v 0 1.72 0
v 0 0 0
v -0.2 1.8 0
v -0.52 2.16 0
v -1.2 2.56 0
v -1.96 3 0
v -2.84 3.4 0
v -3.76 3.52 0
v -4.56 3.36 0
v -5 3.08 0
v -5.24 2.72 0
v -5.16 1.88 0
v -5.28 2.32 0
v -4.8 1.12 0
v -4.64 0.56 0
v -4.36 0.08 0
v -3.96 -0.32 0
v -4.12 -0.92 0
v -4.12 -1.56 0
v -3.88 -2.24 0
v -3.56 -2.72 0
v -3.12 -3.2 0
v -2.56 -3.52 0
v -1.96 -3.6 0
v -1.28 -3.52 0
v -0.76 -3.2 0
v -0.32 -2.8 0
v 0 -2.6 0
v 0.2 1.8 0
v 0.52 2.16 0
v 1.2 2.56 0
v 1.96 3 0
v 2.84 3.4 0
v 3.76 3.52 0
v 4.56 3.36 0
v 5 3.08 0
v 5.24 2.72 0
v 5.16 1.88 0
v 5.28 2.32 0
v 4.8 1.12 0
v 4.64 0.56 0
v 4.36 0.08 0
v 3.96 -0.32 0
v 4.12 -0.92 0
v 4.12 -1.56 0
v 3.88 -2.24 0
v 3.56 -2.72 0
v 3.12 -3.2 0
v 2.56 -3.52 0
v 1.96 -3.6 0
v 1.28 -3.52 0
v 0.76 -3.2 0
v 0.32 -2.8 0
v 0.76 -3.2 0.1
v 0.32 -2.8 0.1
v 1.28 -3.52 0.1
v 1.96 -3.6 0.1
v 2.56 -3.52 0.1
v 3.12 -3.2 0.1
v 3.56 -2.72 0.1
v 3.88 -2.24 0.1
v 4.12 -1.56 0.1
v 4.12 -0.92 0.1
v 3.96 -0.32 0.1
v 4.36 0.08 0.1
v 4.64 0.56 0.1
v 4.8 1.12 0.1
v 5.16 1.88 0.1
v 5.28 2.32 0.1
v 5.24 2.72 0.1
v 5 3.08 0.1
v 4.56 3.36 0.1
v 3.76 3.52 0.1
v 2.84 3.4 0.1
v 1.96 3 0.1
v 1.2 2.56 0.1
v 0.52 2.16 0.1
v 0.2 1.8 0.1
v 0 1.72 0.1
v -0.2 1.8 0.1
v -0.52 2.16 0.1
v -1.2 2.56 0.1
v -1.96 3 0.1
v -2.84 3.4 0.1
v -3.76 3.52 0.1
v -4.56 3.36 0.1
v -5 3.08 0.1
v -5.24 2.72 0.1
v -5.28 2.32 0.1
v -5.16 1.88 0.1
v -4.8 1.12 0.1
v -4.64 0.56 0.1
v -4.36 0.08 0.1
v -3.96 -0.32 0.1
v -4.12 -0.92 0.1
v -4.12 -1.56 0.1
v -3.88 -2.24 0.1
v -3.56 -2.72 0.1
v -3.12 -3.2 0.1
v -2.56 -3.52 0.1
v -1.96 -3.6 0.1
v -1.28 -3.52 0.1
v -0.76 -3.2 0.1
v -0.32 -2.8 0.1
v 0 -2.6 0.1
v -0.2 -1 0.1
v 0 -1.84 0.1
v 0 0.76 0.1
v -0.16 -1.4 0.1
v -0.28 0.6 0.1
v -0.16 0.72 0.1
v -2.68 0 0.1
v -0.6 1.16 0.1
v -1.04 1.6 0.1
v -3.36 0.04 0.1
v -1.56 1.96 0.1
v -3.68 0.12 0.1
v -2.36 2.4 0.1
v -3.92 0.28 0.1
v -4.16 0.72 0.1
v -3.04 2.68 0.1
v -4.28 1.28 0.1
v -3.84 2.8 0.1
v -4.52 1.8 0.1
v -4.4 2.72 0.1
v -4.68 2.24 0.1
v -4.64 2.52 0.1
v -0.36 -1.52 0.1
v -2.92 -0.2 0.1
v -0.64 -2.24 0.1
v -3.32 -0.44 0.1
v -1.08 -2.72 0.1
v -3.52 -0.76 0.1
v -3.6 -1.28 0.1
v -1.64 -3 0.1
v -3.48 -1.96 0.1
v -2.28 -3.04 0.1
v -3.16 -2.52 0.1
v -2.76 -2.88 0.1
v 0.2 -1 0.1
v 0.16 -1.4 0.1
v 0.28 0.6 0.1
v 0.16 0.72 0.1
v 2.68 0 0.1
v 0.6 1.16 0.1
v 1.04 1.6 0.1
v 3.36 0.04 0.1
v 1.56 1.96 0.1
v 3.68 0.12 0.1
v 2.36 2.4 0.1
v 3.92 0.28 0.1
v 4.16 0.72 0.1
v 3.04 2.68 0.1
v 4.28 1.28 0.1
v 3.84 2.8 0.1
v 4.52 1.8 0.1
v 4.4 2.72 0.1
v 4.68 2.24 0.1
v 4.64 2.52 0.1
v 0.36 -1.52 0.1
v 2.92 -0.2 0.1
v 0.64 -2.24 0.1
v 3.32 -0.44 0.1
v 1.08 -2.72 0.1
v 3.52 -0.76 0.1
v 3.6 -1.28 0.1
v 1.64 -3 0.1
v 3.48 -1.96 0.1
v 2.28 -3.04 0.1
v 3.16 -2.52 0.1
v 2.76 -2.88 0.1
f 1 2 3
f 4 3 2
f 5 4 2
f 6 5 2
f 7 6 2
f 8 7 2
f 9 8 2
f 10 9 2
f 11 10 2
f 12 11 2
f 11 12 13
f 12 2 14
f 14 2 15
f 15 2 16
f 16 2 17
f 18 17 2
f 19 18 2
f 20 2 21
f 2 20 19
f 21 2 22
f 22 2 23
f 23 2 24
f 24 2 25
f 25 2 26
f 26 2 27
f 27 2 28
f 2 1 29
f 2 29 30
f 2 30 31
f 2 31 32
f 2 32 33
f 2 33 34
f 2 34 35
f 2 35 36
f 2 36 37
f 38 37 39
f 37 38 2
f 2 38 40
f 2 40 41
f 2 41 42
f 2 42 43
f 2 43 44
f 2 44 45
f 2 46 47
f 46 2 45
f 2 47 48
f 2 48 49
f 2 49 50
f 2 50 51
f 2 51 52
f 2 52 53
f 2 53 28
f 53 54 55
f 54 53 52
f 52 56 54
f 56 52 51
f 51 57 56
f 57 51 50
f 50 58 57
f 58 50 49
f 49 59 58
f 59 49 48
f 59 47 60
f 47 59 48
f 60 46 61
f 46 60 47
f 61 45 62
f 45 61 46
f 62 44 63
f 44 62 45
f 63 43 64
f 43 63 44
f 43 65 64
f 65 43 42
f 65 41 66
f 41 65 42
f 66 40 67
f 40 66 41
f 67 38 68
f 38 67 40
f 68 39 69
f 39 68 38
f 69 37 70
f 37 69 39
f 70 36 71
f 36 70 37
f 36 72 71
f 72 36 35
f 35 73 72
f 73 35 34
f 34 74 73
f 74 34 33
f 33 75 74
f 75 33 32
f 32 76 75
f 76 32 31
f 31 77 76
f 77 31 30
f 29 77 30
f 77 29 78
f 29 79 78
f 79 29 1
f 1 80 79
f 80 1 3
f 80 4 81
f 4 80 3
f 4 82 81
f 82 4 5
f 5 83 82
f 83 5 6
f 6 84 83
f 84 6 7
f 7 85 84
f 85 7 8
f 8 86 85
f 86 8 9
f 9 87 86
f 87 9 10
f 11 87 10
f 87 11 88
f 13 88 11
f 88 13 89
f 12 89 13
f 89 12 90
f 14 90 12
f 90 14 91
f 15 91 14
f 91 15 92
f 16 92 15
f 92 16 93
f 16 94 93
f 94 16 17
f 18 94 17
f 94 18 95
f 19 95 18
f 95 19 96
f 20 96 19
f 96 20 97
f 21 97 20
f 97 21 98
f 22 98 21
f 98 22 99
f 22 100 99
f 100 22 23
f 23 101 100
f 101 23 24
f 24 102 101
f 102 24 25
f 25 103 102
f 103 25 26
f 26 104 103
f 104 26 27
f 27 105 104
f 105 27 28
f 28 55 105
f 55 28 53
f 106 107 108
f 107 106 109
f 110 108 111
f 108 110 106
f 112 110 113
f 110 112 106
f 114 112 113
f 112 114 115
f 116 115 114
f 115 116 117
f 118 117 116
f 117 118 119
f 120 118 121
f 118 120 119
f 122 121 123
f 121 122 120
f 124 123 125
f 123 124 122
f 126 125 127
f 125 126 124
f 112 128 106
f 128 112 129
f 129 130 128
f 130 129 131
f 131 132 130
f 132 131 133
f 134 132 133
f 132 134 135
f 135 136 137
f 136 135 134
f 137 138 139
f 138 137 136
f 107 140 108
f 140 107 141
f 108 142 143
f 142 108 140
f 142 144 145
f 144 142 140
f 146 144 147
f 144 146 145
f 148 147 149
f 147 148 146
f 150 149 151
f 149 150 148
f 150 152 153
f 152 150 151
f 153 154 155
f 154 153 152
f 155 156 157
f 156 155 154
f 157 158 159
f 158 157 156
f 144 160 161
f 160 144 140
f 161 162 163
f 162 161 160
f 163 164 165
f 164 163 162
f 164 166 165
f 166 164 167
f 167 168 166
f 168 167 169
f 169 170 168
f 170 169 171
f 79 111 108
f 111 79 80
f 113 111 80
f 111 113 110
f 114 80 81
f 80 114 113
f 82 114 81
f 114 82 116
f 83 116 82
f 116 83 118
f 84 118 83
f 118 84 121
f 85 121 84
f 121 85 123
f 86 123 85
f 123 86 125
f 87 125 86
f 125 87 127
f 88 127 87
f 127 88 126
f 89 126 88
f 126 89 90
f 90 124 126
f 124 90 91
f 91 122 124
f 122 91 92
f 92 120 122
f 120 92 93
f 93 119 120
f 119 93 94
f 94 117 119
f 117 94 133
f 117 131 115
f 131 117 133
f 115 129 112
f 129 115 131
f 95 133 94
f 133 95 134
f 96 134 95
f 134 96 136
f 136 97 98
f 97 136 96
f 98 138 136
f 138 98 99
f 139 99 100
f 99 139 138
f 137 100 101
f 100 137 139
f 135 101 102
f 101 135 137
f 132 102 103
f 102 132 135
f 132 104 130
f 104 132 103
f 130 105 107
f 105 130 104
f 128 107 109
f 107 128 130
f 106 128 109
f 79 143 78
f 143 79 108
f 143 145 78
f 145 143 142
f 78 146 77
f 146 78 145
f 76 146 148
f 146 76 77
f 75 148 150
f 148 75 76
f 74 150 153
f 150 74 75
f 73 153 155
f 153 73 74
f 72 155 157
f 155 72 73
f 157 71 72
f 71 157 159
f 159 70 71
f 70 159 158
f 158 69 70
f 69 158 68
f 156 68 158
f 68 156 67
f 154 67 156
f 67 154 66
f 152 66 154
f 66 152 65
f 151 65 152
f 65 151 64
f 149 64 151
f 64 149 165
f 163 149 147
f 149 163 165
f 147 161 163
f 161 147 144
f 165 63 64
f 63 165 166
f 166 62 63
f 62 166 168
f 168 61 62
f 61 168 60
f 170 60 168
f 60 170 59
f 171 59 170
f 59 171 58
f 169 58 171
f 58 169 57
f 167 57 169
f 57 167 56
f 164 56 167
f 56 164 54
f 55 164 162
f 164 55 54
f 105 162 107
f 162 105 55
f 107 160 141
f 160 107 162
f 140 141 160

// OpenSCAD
// file: s/4650854is02.scad
use <../../lib.scad>
function ldraw_lib__s__4650854is02() = [
// 0 ~Sticker  0.9 x  1.3 with Butterfly - Shape
// 0 Name: s\4650854is02.dat
// 0 Author: Takeshi Takahashi [RainbowDolphin]
// 0 !LDRAW_ORG Subpart UPDATE 2024-04
// 0 !LICENSE Licensed under CC BY 4.0 : see CAreadme.txt
// 
// 0 BFC CERTIFY CCW
  [0,"BFC","CERTIFY"],
  [0,"BFC","CCW"],
// 
// 0 !HISTORY 2024-05-28 [OrionP] Official Update 2024-04
// 
// 
// 4 16 -.5 -.25 -2.5 -.4 -.25 -3.5 0 -.25 -4.6 0 -.25 1.9
  [4,16,-.5,-.25,-2.5,-.4,-.25,-3.5,0,-.25,-4.6,0,-.25,1.9],
// 4 16 -.5 -.25 -2.5 0 -.25 1.9 -.4 -.25 1.8 -.7 -.25 1.5
  [4,16,-.5,-.25,-2.5,0,-.25,1.9,-.4,-.25,1.8,-.7,-.25,1.5],
// 4 16 -6.7 -.25 0 -.5 -.25 -2.5 -.7 -.25 1.5 -1.5 -.25 2.9
  [4,16,-6.7,-.25,0,-.5,-.25,-2.5,-.7,-.25,1.5,-1.5,-.25,2.9],
// 4 16 -8.4 -.25 .1 -6.7 -.25 0 -1.5 -.25 2.9 -2.6 -.25 4
  [4,16,-8.4,-.25,.1,-6.7,-.25,0,-1.5,-.25,2.9,-2.6,-.25,4],
// 4 16 -9.2 -.25 .3 -8.4 -.25 .1 -2.6 -.25 4 -3.9 -.25 4.9
  [4,16,-9.2,-.25,.3,-8.4,-.25,.1,-2.6,-.25,4,-3.9,-.25,4.9],
// 4 16 -9.8 -.25 .7 -9.2 -.25 .3 -3.9 -.25 4.9 -5.9 -.25 6
  [4,16,-9.8,-.25,.7,-9.2,-.25,.3,-3.9,-.25,4.9,-5.9,-.25,6],
// 4 16 -10.4 -.25 1.8 -9.8 -.25 .7 -5.9 -.25 6 -7.6 -.25 6.7
  [4,16,-10.4,-.25,1.8,-9.8,-.25,.7,-5.9,-.25,6,-7.6,-.25,6.7],
// 4 16 -10.7 -.25 3.2 -10.4 -.25 1.8 -7.6 -.25 6.7 -9.6 -.25 7
  [4,16,-10.7,-.25,3.2,-10.4,-.25,1.8,-7.6,-.25,6.7,-9.6,-.25,7],
// 4 16 -11.3 -.25 4.5 -10.7 -.25 3.2 -9.6 -.25 7 -11 -.25 6.8
  [4,16,-11.3,-.25,4.5,-10.7,-.25,3.2,-9.6,-.25,7,-11,-.25,6.8],
// 4 16 -11.7 -.25 5.6 -11.3 -.25 4.5 -11 -.25 6.8 -11.6 -.25 6.3
  [4,16,-11.7,-.25,5.6,-11.3,-.25,4.5,-11,-.25,6.8,-11.6,-.25,6.3],
// 4 16 -.5 -.25 -2.5 -6.7 -.25 0 -7.3 -.25 -.5 -.9 -.25 -3.8
  [4,16,-.5,-.25,-2.5,-6.7,-.25,0,-7.3,-.25,-.5,-.9,-.25,-3.8],
// 4 16 -.9 -.25 -3.8 -7.3 -.25 -.5 -8.3 -.25 -1.1 -1.6 -.25 -5.6
  [4,16,-.9,-.25,-3.8,-7.3,-.25,-.5,-8.3,-.25,-1.1,-1.6,-.25,-5.6],
// 4 16 -1.6 -.25 -5.6 -8.3 -.25 -1.1 -8.8 -.25 -1.9 -2.7 -.25 -6.8
  [4,16,-1.6,-.25,-5.6,-8.3,-.25,-1.1,-8.8,-.25,-1.9,-2.7,-.25,-6.8],
// 4 16 -2.7 -.25 -6.8 -8.8 -.25 -1.9 -9 -.25 -3.2 -4.1 -.25 -7.5
  [4,16,-2.7,-.25,-6.8,-8.8,-.25,-1.9,-9,-.25,-3.2,-4.1,-.25,-7.5],
// 4 16 -4.1 -.25 -7.5 -9 -.25 -3.2 -8.7 -.25 -4.9 -5.7 -.25 -7.6
  [4,16,-4.1,-.25,-7.5,-9,-.25,-3.2,-8.7,-.25,-4.9,-5.7,-.25,-7.6],
// 4 16 -5.7 -.25 -7.6 -8.7 -.25 -4.9 -7.9 -.25 -6.3 -6.9 -.25 -7.2
  [4,16,-5.7,-.25,-7.6,-8.7,-.25,-4.9,-7.9,-.25,-6.3,-6.9,-.25,-7.2],
// 4 16 0 -.25 -4.6 .4 -.25 -3.5 .5 -.25 -2.5 0 -.25 1.9
  [4,16,0,-.25,-4.6,.4,-.25,-3.5,.5,-.25,-2.5,0,-.25,1.9],
// 4 16 .4 -.25 1.8 0 -.25 1.9 .5 -.25 -2.5 .7 -.25 1.5
  [4,16,.4,-.25,1.8,0,-.25,1.9,.5,-.25,-2.5,.7,-.25,1.5],
// 4 16 .7 -.25 1.5 .5 -.25 -2.5 6.7 -.25 0 1.5 -.25 2.9
  [4,16,.7,-.25,1.5,.5,-.25,-2.5,6.7,-.25,0,1.5,-.25,2.9],
// 4 16 1.5 -.25 2.9 6.7 -.25 0 8.4 -.25 .1 2.6 -.25 4
  [4,16,1.5,-.25,2.9,6.7,-.25,0,8.4,-.25,.1,2.6,-.25,4],
// 4 16 2.6 -.25 4 8.4 -.25 .1 9.2 -.25 .3 3.9 -.25 4.9
  [4,16,2.6,-.25,4,8.4,-.25,.1,9.2,-.25,.3,3.9,-.25,4.9],
// 4 16 3.9 -.25 4.9 9.2 -.25 .3 9.8 -.25 .7 5.9 -.25 6
  [4,16,3.9,-.25,4.9,9.2,-.25,.3,9.8,-.25,.7,5.9,-.25,6],
// 4 16 5.9 -.25 6 9.8 -.25 .7 10.4 -.25 1.8 7.6 -.25 6.7
  [4,16,5.9,-.25,6,9.8,-.25,.7,10.4,-.25,1.8,7.6,-.25,6.7],
// 4 16 7.6 -.25 6.7 10.4 -.25 1.8 10.7 -.25 3.2 9.6 -.25 7
  [4,16,7.6,-.25,6.7,10.4,-.25,1.8,10.7,-.25,3.2,9.6,-.25,7],
// 4 16 9.6 -.25 7 10.7 -.25 3.2 11.3 -.25 4.5 11 -.25 6.8
  [4,16,9.6,-.25,7,10.7,-.25,3.2,11.3,-.25,4.5,11,-.25,6.8],
// 4 16 11 -.25 6.8 11.3 -.25 4.5 11.7 -.25 5.6 11.6 -.25 6.3
  [4,16,11,-.25,6.8,11.3,-.25,4.5,11.7,-.25,5.6,11.6,-.25,6.3],
// 4 16 7.3 -.25 -.5 6.7 -.25 0 .5 -.25 -2.5 .9 -.25 -3.8
  [4,16,7.3,-.25,-.5,6.7,-.25,0,.5,-.25,-2.5,.9,-.25,-3.8],
// 4 16 8.3 -.25 -1.1 7.3 -.25 -.5 .9 -.25 -3.8 1.6 -.25 -5.6
  [4,16,8.3,-.25,-1.1,7.3,-.25,-.5,.9,-.25,-3.8,1.6,-.25,-5.6],
// 4 16 8.8 -.25 -1.9 8.3 -.25 -1.1 1.6 -.25 -5.6 2.7 -.25 -6.8
  [4,16,8.8,-.25,-1.9,8.3,-.25,-1.1,1.6,-.25,-5.6,2.7,-.25,-6.8],
// 4 16 9 -.25 -3.2 8.8 -.25 -1.9 2.7 -.25 -6.8 4.1 -.25 -7.5
  [4,16,9,-.25,-3.2,8.8,-.25,-1.9,2.7,-.25,-6.8,4.1,-.25,-7.5],
// 4 16 8.7 -.25 -4.9 9 -.25 -3.2 4.1 -.25 -7.5 5.7 -.25 -7.6
  [4,16,8.7,-.25,-4.9,9,-.25,-3.2,4.1,-.25,-7.5,5.7,-.25,-7.6],
// 4 16 7.9 -.25 -6.3 8.7 -.25 -4.9 5.7 -.25 -7.6 6.9 -.25 -7.2
  [4,16,7.9,-.25,-6.3,8.7,-.25,-4.9,5.7,-.25,-7.6,6.9,-.25,-7.2],
];
module ldraw_lib__s__4650854is02(step=0, col=false, unit=2/5, alt=false, line=0.2, solid=!$preview)
    makepoly(ldraw_lib__s__4650854is02(), step=step, col=col, unit=unit, alt=alt, line=line, solid=solid);
ldraw_lib__s__4650854is02(line=0.2);
// main file
use <../lib.scad>
use <s/4650854is01.scad>
use <s/4650854is02.scad>
use <s/4650854is03.scad>
function ldraw_lib__4620857c() = [
// 0 Sticker  0.9 x  1.3 with Dark Red Butterfly
// 0 Name: 4620857c.dat
// 0 Author: Takeshi Takahashi [RainbowDolphin]
// 0 !LDRAW_ORG Part UPDATE 2024-04
// 0 !LICENSE Licensed under CC BY 4.0 : see CAreadme.txt
// 
// 0 BFC CERTIFY CCW
  [0,"BFC","CERTIFY"],
  [0,"BFC","CCW"],
// 
// 0 !KEYWORDS Horse, Set 3186, Trailer
// 
// 0 !HISTORY 2024-05-28 [OrionP] Official Update 2024-04
// 
// 
// 1 16 0 0 0 1 0 0 0 1 0 0 0 1 s\4650854is01.dat
  [1,16,0,0,0,1,0,0,0,1,0,0,0,1, ldraw_lib__s__4650854is01()],
// 1 320 0 0 0 1 0 0 0 1 0 0 0 1 s\4650854is02.dat
  [1,320,0,0,0,1,0,0,0,1,0,0,0,1, ldraw_lib__s__4650854is02()],
// 1 29 0 0 0 1 0 0 0 1 0 0 0 1 s\4650854is03.dat
  [1,29,0,0,0,1,0,0,0,1,0,0,0,1, ldraw_lib__s__4650854is03()],
];
module ldraw_lib__4620857c(step=0, col=false, unit=2/5, alt=false, line=0.2, solid=!$preview)
    makepoly(ldraw_lib__4620857c(), step=step, col=col, unit=unit, alt=alt, line=line, solid=solid);
ldraw_lib__4620857c(line=0.2);
